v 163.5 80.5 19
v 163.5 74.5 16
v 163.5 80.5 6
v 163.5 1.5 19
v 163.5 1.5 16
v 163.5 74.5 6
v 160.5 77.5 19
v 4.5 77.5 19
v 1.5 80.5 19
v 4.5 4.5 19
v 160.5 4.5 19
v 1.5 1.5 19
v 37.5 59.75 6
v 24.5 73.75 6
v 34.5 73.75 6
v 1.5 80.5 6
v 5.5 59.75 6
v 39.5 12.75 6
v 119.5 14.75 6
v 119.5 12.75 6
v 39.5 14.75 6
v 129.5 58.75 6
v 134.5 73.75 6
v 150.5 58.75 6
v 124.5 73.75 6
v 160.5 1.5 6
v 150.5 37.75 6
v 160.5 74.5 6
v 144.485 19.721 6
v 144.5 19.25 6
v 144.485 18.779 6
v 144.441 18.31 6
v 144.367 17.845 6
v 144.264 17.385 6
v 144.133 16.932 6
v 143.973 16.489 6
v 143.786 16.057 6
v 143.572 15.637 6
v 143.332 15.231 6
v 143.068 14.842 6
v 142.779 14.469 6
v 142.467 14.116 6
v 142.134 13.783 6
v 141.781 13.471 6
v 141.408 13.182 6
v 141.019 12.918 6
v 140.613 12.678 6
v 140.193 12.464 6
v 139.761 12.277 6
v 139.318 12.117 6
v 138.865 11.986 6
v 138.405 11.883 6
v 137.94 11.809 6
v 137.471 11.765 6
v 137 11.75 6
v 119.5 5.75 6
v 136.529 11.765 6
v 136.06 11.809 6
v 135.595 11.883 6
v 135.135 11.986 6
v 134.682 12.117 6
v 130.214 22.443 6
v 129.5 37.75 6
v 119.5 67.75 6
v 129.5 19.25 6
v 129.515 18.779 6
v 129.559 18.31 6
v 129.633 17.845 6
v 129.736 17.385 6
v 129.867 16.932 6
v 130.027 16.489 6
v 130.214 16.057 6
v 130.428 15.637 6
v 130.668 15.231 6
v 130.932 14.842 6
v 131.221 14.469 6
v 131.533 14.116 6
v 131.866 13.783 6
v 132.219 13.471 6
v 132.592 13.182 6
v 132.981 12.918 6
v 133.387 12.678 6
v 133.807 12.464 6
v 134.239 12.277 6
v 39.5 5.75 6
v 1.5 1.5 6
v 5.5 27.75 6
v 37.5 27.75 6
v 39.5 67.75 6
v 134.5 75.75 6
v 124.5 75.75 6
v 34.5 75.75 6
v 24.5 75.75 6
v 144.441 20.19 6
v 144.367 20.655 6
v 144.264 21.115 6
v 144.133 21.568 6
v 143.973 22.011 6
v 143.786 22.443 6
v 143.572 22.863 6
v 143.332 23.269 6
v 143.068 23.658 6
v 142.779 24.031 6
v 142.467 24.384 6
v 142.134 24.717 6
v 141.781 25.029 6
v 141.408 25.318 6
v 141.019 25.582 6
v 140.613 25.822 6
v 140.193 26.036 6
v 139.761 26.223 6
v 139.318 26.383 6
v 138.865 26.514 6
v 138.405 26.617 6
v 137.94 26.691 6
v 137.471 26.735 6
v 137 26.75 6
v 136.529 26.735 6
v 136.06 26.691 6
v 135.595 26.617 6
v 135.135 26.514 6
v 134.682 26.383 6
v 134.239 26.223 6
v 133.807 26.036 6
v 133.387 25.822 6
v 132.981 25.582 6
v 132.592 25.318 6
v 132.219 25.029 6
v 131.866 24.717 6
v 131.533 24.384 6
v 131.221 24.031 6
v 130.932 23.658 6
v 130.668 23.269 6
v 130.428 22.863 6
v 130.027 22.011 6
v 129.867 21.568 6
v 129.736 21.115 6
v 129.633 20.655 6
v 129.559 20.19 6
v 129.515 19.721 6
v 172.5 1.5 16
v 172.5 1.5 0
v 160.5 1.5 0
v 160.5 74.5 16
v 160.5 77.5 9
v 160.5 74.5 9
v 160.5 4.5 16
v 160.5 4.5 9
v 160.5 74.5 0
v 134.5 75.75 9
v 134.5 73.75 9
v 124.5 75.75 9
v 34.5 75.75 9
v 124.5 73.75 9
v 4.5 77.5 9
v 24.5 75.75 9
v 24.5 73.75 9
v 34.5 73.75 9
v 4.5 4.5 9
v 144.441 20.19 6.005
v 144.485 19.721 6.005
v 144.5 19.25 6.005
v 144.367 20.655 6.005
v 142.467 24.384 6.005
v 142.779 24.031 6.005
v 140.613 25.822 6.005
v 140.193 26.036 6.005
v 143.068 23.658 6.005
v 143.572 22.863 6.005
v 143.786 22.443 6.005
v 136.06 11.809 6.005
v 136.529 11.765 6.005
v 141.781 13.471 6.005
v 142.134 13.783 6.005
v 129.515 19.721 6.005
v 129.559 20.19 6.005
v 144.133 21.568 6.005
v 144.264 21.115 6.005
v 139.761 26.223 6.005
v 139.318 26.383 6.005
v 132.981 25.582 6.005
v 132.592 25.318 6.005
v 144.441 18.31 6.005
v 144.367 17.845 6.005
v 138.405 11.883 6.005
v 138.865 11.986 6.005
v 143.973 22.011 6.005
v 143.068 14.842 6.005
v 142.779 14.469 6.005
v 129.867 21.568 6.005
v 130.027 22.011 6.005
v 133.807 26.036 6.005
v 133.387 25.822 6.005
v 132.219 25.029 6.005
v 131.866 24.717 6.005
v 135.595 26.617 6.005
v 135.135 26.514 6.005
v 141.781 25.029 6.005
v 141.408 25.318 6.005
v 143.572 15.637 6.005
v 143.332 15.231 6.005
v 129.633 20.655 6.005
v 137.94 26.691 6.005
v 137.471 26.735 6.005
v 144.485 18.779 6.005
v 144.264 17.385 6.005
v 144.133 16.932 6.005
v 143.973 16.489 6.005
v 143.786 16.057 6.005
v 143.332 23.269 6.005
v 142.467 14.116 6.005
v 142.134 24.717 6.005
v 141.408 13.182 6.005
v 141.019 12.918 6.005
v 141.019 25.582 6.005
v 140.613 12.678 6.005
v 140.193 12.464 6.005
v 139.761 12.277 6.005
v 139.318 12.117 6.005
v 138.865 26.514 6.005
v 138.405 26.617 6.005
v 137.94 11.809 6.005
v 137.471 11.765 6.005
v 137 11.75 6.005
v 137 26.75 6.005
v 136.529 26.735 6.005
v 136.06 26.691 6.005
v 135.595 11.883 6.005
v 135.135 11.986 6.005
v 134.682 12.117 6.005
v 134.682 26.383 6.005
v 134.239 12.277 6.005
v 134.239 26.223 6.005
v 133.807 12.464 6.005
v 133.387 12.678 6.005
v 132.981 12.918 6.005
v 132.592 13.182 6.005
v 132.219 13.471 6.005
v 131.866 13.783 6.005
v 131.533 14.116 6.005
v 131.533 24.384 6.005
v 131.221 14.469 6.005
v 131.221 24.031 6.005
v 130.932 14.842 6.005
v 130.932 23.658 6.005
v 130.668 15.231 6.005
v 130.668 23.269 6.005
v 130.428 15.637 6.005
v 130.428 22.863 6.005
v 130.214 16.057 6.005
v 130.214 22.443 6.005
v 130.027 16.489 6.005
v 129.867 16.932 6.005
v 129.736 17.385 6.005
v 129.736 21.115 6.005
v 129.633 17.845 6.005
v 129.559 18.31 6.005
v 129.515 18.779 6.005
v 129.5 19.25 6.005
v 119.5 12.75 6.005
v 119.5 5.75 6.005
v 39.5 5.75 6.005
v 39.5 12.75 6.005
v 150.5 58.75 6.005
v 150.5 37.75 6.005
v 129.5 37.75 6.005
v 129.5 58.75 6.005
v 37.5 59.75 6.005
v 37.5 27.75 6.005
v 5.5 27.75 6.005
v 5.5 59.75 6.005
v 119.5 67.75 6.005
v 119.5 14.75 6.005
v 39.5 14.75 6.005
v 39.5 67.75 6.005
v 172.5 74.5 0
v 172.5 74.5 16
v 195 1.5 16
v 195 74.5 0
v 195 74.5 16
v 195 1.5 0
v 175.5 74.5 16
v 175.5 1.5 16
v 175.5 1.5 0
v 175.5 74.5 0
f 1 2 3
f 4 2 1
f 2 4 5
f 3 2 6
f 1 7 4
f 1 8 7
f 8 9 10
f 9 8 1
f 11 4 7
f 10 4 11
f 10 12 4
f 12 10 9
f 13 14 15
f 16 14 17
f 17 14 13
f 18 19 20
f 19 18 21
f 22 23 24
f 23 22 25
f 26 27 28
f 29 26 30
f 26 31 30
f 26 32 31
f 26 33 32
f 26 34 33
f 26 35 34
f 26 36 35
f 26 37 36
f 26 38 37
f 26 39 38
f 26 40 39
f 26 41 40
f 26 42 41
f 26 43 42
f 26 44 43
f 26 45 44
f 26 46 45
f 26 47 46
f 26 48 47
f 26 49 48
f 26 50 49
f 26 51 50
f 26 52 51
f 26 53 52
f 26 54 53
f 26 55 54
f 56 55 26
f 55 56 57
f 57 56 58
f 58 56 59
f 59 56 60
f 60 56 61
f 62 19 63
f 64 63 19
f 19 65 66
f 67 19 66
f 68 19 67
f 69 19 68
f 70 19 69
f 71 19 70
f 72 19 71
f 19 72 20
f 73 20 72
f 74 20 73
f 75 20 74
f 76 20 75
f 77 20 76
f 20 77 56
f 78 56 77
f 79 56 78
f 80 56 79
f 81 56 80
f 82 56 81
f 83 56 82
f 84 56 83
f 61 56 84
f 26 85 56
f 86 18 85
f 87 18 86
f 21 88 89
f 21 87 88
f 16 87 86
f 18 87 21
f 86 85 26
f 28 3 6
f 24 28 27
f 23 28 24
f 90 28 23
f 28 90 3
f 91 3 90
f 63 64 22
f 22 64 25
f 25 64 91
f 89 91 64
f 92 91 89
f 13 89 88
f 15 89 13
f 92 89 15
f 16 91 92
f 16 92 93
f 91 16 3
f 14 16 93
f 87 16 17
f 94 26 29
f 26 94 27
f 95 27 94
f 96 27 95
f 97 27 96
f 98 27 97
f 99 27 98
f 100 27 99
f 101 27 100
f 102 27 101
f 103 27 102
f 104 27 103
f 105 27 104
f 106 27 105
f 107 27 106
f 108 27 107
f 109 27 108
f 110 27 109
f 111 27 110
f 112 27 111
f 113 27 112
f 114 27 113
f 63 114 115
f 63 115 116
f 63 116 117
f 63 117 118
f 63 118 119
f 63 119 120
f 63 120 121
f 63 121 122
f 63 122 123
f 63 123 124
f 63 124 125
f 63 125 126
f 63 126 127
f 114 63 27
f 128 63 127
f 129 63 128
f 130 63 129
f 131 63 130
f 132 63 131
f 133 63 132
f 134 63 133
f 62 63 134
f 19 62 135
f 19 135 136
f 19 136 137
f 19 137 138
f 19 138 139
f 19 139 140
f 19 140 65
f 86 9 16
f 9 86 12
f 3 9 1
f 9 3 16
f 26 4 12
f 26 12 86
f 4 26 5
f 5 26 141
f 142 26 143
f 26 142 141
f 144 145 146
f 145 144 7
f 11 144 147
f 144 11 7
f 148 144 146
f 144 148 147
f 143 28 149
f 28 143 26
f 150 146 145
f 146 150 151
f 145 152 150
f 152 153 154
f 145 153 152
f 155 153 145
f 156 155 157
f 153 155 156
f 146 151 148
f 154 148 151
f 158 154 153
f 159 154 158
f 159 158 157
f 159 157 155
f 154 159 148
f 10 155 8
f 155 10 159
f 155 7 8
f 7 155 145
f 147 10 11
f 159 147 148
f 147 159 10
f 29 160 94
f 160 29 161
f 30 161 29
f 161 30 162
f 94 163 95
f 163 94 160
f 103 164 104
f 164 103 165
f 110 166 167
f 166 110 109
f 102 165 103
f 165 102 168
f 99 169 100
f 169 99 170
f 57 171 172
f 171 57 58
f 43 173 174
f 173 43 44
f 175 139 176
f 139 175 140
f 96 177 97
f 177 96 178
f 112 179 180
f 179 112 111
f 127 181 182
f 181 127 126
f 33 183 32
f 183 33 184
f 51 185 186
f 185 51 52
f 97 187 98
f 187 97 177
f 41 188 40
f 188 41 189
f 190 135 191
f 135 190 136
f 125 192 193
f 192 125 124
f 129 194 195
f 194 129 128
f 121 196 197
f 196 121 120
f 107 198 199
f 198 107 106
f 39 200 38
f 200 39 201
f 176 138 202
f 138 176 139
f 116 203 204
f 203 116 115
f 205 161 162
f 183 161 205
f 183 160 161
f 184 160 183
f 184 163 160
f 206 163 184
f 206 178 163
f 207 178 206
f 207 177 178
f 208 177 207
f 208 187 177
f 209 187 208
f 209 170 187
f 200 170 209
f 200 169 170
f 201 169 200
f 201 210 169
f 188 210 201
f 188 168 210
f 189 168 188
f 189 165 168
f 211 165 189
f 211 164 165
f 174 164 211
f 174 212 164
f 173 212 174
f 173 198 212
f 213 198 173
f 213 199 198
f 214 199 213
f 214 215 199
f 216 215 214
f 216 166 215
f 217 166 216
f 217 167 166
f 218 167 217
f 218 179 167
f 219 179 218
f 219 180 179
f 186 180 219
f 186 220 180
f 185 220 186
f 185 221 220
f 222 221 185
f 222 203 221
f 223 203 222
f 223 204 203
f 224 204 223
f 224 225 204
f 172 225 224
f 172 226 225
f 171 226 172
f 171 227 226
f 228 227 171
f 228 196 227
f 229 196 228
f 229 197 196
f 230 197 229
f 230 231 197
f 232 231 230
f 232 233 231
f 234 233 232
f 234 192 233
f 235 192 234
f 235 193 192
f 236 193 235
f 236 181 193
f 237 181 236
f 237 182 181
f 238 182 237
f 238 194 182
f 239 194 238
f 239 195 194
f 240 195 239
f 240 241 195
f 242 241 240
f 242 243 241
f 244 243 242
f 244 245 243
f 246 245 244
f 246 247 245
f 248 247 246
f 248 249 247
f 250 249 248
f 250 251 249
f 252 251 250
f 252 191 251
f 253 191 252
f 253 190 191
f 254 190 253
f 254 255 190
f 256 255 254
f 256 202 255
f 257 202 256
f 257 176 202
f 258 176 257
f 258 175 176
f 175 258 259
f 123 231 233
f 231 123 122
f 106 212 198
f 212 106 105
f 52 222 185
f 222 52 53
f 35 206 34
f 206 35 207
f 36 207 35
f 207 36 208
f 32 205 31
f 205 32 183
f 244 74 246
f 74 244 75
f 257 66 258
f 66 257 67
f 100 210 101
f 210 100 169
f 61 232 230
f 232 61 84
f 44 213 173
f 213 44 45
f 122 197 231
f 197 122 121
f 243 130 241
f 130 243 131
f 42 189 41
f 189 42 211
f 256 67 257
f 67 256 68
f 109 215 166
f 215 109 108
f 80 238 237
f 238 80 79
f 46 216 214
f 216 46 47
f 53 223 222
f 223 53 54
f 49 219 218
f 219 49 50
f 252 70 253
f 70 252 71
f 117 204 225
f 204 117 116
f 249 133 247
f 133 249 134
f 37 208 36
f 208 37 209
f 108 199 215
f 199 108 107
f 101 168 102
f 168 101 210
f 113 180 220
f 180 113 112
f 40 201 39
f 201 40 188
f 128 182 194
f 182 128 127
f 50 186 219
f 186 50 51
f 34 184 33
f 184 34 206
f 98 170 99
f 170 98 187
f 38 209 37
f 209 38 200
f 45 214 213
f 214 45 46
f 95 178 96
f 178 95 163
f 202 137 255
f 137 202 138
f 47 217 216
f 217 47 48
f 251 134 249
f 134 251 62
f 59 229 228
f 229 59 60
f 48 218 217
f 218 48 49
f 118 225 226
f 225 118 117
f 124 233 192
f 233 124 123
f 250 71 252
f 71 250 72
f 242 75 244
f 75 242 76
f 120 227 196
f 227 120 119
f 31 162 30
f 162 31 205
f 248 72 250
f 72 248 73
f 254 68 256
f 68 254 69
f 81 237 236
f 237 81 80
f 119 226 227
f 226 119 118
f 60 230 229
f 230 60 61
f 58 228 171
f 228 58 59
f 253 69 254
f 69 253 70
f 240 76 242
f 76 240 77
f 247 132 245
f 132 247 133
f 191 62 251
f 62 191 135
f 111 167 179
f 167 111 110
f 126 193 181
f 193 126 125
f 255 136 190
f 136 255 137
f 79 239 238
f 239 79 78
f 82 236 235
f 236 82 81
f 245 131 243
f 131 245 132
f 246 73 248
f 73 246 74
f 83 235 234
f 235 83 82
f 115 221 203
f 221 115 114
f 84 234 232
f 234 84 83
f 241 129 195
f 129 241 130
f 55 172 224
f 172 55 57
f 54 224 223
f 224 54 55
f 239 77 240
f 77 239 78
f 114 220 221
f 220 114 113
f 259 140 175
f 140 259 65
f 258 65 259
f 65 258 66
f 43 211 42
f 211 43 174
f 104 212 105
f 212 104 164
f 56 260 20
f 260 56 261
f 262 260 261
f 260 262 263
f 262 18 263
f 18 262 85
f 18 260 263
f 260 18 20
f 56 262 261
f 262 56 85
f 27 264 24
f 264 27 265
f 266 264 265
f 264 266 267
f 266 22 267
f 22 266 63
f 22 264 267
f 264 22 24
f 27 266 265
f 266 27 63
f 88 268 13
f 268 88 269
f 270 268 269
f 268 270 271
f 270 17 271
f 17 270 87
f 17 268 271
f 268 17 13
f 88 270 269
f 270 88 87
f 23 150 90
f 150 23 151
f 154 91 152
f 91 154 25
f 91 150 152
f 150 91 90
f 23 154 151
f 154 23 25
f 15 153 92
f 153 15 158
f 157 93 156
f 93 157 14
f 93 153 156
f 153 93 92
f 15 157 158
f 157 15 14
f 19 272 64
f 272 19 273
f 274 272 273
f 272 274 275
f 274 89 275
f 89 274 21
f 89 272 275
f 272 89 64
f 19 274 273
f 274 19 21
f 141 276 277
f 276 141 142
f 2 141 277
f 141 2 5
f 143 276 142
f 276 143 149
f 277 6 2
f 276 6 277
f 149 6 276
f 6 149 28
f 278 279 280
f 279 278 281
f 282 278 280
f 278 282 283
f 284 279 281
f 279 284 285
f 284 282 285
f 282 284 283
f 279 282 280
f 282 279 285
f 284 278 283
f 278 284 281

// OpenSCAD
$fn = 100;

caseRim = 3;
kbD = 82;
kbW = 210;
kbH = 7;
odH = 10;
odW = 156;
odD = 73;
odJSH = 6;

// Odroid cutout dimensions
odJSW = 28 - 13;
odJSR = odJSW / 2;
odJSoffX = 13;
odJSoffY = 11;
odBRW = 118 - 38;
odBRD = 12 - 5;
odBRoffX = 38;
odBRoffY = 5;
odCRW = 28 - 7;
odCRD = 58 - 37;
odCRoffX = 7;
odCRoffY = 37;
odTBW = 152 - 120;
odTBD = 61 - 27;
odTBoffX = 120;
odTBoffY = 27;
odTLoffX = 23;
odTLoffY = odD;
odTLW = 33 - 23;
odTLD = 2;
odTH = 20;
odTRoffX = 123;
odTRoffY = odD;
odTRW = odTLW;
odTRD = odTLD;
odDPW = odBRW;
odDPD = 67 - 14;
odDPoffY = 14;
odDPoffX = odBRoffX;

// Crea una caja abierta sin tapa
module containerOpenLid(width, depth, height, wall, floor, nibDir, tol) {
    difference() {
        // Caja externa
        cube([width + wall * 2, depth + wall * 2, height + floor]);
        // Hueco interior
        translate([wall, wall, floor])
            cube([width, depth, height + 1]);
    }
}

// Ranura vertical para periféricos
module containerVertSlot(width, depth, height, wall, floor, nibDir, tol) {
    cube([width, depth, height]);
}

// Caja principal con recortes
difference() {
    translate([caseRim / 2, caseRim / 2, odJSH])
        containerOpenLid(odW, odD, odH, caseRim, odJSH - caseRim, "nibY", 0.6);

    offset = 0.01;
    translate([1.5, .75, -offset / 2]) union() {
        translate([odW - odJSR * 2 - odJSoffX, odJSoffY, 0] + [odJSR, odJSR, 0])
            cylinder(h = odJSH + offset, r = odJSR);
        translate([odW - odBRW - odBRoffX, odBRoffY, 0])
            cube([odBRW, odBRD, odJSH + offset]);
        translate([odW - odCRW - odCRoffX, odCRoffY, 0])
            cube([odCRW, odCRW, odJSH + offset]);
        translate([odW - odTBW - odTBoffX, odTBoffY, 0])
            cube([odTBW, odTBW, odJSH + offset]);
        translate([odW - odTLW - odTLoffX, odTLoffY, odJSH - .1])
            cube([odTLW, odTLD, odTH + offset]);
        translate([odW - odTRW - odTRoffX, odTRoffY, odJSH - .1])
            cube([odTRW, odTRD, odTH + offset]);
        translate([odW - odDPW - odDPoffX, odDPoffY, 0])
            cube([odDPW, odDPD, odJSH + offset]);
    }
}

// Slots para periféricos
floorDepth = 0;
// Microuter slot
translate([caseRim / 2 + caseRim + odW, caseRim / 2, floorDepth])
    containerVertSlot(12, odD, odH + odJSH, caseRim, floorDepth - caseRim, "nibY", .6);

// Micro USB 3 Port Hub
translate([caseRim / 2 + 2 * caseRim + odW + 12, caseRim / 2, floorDepth])
    containerVertSlot(19.5, odD, odH + odJSH, caseRim, floorDepth - caseRim, "nibY", .6);
